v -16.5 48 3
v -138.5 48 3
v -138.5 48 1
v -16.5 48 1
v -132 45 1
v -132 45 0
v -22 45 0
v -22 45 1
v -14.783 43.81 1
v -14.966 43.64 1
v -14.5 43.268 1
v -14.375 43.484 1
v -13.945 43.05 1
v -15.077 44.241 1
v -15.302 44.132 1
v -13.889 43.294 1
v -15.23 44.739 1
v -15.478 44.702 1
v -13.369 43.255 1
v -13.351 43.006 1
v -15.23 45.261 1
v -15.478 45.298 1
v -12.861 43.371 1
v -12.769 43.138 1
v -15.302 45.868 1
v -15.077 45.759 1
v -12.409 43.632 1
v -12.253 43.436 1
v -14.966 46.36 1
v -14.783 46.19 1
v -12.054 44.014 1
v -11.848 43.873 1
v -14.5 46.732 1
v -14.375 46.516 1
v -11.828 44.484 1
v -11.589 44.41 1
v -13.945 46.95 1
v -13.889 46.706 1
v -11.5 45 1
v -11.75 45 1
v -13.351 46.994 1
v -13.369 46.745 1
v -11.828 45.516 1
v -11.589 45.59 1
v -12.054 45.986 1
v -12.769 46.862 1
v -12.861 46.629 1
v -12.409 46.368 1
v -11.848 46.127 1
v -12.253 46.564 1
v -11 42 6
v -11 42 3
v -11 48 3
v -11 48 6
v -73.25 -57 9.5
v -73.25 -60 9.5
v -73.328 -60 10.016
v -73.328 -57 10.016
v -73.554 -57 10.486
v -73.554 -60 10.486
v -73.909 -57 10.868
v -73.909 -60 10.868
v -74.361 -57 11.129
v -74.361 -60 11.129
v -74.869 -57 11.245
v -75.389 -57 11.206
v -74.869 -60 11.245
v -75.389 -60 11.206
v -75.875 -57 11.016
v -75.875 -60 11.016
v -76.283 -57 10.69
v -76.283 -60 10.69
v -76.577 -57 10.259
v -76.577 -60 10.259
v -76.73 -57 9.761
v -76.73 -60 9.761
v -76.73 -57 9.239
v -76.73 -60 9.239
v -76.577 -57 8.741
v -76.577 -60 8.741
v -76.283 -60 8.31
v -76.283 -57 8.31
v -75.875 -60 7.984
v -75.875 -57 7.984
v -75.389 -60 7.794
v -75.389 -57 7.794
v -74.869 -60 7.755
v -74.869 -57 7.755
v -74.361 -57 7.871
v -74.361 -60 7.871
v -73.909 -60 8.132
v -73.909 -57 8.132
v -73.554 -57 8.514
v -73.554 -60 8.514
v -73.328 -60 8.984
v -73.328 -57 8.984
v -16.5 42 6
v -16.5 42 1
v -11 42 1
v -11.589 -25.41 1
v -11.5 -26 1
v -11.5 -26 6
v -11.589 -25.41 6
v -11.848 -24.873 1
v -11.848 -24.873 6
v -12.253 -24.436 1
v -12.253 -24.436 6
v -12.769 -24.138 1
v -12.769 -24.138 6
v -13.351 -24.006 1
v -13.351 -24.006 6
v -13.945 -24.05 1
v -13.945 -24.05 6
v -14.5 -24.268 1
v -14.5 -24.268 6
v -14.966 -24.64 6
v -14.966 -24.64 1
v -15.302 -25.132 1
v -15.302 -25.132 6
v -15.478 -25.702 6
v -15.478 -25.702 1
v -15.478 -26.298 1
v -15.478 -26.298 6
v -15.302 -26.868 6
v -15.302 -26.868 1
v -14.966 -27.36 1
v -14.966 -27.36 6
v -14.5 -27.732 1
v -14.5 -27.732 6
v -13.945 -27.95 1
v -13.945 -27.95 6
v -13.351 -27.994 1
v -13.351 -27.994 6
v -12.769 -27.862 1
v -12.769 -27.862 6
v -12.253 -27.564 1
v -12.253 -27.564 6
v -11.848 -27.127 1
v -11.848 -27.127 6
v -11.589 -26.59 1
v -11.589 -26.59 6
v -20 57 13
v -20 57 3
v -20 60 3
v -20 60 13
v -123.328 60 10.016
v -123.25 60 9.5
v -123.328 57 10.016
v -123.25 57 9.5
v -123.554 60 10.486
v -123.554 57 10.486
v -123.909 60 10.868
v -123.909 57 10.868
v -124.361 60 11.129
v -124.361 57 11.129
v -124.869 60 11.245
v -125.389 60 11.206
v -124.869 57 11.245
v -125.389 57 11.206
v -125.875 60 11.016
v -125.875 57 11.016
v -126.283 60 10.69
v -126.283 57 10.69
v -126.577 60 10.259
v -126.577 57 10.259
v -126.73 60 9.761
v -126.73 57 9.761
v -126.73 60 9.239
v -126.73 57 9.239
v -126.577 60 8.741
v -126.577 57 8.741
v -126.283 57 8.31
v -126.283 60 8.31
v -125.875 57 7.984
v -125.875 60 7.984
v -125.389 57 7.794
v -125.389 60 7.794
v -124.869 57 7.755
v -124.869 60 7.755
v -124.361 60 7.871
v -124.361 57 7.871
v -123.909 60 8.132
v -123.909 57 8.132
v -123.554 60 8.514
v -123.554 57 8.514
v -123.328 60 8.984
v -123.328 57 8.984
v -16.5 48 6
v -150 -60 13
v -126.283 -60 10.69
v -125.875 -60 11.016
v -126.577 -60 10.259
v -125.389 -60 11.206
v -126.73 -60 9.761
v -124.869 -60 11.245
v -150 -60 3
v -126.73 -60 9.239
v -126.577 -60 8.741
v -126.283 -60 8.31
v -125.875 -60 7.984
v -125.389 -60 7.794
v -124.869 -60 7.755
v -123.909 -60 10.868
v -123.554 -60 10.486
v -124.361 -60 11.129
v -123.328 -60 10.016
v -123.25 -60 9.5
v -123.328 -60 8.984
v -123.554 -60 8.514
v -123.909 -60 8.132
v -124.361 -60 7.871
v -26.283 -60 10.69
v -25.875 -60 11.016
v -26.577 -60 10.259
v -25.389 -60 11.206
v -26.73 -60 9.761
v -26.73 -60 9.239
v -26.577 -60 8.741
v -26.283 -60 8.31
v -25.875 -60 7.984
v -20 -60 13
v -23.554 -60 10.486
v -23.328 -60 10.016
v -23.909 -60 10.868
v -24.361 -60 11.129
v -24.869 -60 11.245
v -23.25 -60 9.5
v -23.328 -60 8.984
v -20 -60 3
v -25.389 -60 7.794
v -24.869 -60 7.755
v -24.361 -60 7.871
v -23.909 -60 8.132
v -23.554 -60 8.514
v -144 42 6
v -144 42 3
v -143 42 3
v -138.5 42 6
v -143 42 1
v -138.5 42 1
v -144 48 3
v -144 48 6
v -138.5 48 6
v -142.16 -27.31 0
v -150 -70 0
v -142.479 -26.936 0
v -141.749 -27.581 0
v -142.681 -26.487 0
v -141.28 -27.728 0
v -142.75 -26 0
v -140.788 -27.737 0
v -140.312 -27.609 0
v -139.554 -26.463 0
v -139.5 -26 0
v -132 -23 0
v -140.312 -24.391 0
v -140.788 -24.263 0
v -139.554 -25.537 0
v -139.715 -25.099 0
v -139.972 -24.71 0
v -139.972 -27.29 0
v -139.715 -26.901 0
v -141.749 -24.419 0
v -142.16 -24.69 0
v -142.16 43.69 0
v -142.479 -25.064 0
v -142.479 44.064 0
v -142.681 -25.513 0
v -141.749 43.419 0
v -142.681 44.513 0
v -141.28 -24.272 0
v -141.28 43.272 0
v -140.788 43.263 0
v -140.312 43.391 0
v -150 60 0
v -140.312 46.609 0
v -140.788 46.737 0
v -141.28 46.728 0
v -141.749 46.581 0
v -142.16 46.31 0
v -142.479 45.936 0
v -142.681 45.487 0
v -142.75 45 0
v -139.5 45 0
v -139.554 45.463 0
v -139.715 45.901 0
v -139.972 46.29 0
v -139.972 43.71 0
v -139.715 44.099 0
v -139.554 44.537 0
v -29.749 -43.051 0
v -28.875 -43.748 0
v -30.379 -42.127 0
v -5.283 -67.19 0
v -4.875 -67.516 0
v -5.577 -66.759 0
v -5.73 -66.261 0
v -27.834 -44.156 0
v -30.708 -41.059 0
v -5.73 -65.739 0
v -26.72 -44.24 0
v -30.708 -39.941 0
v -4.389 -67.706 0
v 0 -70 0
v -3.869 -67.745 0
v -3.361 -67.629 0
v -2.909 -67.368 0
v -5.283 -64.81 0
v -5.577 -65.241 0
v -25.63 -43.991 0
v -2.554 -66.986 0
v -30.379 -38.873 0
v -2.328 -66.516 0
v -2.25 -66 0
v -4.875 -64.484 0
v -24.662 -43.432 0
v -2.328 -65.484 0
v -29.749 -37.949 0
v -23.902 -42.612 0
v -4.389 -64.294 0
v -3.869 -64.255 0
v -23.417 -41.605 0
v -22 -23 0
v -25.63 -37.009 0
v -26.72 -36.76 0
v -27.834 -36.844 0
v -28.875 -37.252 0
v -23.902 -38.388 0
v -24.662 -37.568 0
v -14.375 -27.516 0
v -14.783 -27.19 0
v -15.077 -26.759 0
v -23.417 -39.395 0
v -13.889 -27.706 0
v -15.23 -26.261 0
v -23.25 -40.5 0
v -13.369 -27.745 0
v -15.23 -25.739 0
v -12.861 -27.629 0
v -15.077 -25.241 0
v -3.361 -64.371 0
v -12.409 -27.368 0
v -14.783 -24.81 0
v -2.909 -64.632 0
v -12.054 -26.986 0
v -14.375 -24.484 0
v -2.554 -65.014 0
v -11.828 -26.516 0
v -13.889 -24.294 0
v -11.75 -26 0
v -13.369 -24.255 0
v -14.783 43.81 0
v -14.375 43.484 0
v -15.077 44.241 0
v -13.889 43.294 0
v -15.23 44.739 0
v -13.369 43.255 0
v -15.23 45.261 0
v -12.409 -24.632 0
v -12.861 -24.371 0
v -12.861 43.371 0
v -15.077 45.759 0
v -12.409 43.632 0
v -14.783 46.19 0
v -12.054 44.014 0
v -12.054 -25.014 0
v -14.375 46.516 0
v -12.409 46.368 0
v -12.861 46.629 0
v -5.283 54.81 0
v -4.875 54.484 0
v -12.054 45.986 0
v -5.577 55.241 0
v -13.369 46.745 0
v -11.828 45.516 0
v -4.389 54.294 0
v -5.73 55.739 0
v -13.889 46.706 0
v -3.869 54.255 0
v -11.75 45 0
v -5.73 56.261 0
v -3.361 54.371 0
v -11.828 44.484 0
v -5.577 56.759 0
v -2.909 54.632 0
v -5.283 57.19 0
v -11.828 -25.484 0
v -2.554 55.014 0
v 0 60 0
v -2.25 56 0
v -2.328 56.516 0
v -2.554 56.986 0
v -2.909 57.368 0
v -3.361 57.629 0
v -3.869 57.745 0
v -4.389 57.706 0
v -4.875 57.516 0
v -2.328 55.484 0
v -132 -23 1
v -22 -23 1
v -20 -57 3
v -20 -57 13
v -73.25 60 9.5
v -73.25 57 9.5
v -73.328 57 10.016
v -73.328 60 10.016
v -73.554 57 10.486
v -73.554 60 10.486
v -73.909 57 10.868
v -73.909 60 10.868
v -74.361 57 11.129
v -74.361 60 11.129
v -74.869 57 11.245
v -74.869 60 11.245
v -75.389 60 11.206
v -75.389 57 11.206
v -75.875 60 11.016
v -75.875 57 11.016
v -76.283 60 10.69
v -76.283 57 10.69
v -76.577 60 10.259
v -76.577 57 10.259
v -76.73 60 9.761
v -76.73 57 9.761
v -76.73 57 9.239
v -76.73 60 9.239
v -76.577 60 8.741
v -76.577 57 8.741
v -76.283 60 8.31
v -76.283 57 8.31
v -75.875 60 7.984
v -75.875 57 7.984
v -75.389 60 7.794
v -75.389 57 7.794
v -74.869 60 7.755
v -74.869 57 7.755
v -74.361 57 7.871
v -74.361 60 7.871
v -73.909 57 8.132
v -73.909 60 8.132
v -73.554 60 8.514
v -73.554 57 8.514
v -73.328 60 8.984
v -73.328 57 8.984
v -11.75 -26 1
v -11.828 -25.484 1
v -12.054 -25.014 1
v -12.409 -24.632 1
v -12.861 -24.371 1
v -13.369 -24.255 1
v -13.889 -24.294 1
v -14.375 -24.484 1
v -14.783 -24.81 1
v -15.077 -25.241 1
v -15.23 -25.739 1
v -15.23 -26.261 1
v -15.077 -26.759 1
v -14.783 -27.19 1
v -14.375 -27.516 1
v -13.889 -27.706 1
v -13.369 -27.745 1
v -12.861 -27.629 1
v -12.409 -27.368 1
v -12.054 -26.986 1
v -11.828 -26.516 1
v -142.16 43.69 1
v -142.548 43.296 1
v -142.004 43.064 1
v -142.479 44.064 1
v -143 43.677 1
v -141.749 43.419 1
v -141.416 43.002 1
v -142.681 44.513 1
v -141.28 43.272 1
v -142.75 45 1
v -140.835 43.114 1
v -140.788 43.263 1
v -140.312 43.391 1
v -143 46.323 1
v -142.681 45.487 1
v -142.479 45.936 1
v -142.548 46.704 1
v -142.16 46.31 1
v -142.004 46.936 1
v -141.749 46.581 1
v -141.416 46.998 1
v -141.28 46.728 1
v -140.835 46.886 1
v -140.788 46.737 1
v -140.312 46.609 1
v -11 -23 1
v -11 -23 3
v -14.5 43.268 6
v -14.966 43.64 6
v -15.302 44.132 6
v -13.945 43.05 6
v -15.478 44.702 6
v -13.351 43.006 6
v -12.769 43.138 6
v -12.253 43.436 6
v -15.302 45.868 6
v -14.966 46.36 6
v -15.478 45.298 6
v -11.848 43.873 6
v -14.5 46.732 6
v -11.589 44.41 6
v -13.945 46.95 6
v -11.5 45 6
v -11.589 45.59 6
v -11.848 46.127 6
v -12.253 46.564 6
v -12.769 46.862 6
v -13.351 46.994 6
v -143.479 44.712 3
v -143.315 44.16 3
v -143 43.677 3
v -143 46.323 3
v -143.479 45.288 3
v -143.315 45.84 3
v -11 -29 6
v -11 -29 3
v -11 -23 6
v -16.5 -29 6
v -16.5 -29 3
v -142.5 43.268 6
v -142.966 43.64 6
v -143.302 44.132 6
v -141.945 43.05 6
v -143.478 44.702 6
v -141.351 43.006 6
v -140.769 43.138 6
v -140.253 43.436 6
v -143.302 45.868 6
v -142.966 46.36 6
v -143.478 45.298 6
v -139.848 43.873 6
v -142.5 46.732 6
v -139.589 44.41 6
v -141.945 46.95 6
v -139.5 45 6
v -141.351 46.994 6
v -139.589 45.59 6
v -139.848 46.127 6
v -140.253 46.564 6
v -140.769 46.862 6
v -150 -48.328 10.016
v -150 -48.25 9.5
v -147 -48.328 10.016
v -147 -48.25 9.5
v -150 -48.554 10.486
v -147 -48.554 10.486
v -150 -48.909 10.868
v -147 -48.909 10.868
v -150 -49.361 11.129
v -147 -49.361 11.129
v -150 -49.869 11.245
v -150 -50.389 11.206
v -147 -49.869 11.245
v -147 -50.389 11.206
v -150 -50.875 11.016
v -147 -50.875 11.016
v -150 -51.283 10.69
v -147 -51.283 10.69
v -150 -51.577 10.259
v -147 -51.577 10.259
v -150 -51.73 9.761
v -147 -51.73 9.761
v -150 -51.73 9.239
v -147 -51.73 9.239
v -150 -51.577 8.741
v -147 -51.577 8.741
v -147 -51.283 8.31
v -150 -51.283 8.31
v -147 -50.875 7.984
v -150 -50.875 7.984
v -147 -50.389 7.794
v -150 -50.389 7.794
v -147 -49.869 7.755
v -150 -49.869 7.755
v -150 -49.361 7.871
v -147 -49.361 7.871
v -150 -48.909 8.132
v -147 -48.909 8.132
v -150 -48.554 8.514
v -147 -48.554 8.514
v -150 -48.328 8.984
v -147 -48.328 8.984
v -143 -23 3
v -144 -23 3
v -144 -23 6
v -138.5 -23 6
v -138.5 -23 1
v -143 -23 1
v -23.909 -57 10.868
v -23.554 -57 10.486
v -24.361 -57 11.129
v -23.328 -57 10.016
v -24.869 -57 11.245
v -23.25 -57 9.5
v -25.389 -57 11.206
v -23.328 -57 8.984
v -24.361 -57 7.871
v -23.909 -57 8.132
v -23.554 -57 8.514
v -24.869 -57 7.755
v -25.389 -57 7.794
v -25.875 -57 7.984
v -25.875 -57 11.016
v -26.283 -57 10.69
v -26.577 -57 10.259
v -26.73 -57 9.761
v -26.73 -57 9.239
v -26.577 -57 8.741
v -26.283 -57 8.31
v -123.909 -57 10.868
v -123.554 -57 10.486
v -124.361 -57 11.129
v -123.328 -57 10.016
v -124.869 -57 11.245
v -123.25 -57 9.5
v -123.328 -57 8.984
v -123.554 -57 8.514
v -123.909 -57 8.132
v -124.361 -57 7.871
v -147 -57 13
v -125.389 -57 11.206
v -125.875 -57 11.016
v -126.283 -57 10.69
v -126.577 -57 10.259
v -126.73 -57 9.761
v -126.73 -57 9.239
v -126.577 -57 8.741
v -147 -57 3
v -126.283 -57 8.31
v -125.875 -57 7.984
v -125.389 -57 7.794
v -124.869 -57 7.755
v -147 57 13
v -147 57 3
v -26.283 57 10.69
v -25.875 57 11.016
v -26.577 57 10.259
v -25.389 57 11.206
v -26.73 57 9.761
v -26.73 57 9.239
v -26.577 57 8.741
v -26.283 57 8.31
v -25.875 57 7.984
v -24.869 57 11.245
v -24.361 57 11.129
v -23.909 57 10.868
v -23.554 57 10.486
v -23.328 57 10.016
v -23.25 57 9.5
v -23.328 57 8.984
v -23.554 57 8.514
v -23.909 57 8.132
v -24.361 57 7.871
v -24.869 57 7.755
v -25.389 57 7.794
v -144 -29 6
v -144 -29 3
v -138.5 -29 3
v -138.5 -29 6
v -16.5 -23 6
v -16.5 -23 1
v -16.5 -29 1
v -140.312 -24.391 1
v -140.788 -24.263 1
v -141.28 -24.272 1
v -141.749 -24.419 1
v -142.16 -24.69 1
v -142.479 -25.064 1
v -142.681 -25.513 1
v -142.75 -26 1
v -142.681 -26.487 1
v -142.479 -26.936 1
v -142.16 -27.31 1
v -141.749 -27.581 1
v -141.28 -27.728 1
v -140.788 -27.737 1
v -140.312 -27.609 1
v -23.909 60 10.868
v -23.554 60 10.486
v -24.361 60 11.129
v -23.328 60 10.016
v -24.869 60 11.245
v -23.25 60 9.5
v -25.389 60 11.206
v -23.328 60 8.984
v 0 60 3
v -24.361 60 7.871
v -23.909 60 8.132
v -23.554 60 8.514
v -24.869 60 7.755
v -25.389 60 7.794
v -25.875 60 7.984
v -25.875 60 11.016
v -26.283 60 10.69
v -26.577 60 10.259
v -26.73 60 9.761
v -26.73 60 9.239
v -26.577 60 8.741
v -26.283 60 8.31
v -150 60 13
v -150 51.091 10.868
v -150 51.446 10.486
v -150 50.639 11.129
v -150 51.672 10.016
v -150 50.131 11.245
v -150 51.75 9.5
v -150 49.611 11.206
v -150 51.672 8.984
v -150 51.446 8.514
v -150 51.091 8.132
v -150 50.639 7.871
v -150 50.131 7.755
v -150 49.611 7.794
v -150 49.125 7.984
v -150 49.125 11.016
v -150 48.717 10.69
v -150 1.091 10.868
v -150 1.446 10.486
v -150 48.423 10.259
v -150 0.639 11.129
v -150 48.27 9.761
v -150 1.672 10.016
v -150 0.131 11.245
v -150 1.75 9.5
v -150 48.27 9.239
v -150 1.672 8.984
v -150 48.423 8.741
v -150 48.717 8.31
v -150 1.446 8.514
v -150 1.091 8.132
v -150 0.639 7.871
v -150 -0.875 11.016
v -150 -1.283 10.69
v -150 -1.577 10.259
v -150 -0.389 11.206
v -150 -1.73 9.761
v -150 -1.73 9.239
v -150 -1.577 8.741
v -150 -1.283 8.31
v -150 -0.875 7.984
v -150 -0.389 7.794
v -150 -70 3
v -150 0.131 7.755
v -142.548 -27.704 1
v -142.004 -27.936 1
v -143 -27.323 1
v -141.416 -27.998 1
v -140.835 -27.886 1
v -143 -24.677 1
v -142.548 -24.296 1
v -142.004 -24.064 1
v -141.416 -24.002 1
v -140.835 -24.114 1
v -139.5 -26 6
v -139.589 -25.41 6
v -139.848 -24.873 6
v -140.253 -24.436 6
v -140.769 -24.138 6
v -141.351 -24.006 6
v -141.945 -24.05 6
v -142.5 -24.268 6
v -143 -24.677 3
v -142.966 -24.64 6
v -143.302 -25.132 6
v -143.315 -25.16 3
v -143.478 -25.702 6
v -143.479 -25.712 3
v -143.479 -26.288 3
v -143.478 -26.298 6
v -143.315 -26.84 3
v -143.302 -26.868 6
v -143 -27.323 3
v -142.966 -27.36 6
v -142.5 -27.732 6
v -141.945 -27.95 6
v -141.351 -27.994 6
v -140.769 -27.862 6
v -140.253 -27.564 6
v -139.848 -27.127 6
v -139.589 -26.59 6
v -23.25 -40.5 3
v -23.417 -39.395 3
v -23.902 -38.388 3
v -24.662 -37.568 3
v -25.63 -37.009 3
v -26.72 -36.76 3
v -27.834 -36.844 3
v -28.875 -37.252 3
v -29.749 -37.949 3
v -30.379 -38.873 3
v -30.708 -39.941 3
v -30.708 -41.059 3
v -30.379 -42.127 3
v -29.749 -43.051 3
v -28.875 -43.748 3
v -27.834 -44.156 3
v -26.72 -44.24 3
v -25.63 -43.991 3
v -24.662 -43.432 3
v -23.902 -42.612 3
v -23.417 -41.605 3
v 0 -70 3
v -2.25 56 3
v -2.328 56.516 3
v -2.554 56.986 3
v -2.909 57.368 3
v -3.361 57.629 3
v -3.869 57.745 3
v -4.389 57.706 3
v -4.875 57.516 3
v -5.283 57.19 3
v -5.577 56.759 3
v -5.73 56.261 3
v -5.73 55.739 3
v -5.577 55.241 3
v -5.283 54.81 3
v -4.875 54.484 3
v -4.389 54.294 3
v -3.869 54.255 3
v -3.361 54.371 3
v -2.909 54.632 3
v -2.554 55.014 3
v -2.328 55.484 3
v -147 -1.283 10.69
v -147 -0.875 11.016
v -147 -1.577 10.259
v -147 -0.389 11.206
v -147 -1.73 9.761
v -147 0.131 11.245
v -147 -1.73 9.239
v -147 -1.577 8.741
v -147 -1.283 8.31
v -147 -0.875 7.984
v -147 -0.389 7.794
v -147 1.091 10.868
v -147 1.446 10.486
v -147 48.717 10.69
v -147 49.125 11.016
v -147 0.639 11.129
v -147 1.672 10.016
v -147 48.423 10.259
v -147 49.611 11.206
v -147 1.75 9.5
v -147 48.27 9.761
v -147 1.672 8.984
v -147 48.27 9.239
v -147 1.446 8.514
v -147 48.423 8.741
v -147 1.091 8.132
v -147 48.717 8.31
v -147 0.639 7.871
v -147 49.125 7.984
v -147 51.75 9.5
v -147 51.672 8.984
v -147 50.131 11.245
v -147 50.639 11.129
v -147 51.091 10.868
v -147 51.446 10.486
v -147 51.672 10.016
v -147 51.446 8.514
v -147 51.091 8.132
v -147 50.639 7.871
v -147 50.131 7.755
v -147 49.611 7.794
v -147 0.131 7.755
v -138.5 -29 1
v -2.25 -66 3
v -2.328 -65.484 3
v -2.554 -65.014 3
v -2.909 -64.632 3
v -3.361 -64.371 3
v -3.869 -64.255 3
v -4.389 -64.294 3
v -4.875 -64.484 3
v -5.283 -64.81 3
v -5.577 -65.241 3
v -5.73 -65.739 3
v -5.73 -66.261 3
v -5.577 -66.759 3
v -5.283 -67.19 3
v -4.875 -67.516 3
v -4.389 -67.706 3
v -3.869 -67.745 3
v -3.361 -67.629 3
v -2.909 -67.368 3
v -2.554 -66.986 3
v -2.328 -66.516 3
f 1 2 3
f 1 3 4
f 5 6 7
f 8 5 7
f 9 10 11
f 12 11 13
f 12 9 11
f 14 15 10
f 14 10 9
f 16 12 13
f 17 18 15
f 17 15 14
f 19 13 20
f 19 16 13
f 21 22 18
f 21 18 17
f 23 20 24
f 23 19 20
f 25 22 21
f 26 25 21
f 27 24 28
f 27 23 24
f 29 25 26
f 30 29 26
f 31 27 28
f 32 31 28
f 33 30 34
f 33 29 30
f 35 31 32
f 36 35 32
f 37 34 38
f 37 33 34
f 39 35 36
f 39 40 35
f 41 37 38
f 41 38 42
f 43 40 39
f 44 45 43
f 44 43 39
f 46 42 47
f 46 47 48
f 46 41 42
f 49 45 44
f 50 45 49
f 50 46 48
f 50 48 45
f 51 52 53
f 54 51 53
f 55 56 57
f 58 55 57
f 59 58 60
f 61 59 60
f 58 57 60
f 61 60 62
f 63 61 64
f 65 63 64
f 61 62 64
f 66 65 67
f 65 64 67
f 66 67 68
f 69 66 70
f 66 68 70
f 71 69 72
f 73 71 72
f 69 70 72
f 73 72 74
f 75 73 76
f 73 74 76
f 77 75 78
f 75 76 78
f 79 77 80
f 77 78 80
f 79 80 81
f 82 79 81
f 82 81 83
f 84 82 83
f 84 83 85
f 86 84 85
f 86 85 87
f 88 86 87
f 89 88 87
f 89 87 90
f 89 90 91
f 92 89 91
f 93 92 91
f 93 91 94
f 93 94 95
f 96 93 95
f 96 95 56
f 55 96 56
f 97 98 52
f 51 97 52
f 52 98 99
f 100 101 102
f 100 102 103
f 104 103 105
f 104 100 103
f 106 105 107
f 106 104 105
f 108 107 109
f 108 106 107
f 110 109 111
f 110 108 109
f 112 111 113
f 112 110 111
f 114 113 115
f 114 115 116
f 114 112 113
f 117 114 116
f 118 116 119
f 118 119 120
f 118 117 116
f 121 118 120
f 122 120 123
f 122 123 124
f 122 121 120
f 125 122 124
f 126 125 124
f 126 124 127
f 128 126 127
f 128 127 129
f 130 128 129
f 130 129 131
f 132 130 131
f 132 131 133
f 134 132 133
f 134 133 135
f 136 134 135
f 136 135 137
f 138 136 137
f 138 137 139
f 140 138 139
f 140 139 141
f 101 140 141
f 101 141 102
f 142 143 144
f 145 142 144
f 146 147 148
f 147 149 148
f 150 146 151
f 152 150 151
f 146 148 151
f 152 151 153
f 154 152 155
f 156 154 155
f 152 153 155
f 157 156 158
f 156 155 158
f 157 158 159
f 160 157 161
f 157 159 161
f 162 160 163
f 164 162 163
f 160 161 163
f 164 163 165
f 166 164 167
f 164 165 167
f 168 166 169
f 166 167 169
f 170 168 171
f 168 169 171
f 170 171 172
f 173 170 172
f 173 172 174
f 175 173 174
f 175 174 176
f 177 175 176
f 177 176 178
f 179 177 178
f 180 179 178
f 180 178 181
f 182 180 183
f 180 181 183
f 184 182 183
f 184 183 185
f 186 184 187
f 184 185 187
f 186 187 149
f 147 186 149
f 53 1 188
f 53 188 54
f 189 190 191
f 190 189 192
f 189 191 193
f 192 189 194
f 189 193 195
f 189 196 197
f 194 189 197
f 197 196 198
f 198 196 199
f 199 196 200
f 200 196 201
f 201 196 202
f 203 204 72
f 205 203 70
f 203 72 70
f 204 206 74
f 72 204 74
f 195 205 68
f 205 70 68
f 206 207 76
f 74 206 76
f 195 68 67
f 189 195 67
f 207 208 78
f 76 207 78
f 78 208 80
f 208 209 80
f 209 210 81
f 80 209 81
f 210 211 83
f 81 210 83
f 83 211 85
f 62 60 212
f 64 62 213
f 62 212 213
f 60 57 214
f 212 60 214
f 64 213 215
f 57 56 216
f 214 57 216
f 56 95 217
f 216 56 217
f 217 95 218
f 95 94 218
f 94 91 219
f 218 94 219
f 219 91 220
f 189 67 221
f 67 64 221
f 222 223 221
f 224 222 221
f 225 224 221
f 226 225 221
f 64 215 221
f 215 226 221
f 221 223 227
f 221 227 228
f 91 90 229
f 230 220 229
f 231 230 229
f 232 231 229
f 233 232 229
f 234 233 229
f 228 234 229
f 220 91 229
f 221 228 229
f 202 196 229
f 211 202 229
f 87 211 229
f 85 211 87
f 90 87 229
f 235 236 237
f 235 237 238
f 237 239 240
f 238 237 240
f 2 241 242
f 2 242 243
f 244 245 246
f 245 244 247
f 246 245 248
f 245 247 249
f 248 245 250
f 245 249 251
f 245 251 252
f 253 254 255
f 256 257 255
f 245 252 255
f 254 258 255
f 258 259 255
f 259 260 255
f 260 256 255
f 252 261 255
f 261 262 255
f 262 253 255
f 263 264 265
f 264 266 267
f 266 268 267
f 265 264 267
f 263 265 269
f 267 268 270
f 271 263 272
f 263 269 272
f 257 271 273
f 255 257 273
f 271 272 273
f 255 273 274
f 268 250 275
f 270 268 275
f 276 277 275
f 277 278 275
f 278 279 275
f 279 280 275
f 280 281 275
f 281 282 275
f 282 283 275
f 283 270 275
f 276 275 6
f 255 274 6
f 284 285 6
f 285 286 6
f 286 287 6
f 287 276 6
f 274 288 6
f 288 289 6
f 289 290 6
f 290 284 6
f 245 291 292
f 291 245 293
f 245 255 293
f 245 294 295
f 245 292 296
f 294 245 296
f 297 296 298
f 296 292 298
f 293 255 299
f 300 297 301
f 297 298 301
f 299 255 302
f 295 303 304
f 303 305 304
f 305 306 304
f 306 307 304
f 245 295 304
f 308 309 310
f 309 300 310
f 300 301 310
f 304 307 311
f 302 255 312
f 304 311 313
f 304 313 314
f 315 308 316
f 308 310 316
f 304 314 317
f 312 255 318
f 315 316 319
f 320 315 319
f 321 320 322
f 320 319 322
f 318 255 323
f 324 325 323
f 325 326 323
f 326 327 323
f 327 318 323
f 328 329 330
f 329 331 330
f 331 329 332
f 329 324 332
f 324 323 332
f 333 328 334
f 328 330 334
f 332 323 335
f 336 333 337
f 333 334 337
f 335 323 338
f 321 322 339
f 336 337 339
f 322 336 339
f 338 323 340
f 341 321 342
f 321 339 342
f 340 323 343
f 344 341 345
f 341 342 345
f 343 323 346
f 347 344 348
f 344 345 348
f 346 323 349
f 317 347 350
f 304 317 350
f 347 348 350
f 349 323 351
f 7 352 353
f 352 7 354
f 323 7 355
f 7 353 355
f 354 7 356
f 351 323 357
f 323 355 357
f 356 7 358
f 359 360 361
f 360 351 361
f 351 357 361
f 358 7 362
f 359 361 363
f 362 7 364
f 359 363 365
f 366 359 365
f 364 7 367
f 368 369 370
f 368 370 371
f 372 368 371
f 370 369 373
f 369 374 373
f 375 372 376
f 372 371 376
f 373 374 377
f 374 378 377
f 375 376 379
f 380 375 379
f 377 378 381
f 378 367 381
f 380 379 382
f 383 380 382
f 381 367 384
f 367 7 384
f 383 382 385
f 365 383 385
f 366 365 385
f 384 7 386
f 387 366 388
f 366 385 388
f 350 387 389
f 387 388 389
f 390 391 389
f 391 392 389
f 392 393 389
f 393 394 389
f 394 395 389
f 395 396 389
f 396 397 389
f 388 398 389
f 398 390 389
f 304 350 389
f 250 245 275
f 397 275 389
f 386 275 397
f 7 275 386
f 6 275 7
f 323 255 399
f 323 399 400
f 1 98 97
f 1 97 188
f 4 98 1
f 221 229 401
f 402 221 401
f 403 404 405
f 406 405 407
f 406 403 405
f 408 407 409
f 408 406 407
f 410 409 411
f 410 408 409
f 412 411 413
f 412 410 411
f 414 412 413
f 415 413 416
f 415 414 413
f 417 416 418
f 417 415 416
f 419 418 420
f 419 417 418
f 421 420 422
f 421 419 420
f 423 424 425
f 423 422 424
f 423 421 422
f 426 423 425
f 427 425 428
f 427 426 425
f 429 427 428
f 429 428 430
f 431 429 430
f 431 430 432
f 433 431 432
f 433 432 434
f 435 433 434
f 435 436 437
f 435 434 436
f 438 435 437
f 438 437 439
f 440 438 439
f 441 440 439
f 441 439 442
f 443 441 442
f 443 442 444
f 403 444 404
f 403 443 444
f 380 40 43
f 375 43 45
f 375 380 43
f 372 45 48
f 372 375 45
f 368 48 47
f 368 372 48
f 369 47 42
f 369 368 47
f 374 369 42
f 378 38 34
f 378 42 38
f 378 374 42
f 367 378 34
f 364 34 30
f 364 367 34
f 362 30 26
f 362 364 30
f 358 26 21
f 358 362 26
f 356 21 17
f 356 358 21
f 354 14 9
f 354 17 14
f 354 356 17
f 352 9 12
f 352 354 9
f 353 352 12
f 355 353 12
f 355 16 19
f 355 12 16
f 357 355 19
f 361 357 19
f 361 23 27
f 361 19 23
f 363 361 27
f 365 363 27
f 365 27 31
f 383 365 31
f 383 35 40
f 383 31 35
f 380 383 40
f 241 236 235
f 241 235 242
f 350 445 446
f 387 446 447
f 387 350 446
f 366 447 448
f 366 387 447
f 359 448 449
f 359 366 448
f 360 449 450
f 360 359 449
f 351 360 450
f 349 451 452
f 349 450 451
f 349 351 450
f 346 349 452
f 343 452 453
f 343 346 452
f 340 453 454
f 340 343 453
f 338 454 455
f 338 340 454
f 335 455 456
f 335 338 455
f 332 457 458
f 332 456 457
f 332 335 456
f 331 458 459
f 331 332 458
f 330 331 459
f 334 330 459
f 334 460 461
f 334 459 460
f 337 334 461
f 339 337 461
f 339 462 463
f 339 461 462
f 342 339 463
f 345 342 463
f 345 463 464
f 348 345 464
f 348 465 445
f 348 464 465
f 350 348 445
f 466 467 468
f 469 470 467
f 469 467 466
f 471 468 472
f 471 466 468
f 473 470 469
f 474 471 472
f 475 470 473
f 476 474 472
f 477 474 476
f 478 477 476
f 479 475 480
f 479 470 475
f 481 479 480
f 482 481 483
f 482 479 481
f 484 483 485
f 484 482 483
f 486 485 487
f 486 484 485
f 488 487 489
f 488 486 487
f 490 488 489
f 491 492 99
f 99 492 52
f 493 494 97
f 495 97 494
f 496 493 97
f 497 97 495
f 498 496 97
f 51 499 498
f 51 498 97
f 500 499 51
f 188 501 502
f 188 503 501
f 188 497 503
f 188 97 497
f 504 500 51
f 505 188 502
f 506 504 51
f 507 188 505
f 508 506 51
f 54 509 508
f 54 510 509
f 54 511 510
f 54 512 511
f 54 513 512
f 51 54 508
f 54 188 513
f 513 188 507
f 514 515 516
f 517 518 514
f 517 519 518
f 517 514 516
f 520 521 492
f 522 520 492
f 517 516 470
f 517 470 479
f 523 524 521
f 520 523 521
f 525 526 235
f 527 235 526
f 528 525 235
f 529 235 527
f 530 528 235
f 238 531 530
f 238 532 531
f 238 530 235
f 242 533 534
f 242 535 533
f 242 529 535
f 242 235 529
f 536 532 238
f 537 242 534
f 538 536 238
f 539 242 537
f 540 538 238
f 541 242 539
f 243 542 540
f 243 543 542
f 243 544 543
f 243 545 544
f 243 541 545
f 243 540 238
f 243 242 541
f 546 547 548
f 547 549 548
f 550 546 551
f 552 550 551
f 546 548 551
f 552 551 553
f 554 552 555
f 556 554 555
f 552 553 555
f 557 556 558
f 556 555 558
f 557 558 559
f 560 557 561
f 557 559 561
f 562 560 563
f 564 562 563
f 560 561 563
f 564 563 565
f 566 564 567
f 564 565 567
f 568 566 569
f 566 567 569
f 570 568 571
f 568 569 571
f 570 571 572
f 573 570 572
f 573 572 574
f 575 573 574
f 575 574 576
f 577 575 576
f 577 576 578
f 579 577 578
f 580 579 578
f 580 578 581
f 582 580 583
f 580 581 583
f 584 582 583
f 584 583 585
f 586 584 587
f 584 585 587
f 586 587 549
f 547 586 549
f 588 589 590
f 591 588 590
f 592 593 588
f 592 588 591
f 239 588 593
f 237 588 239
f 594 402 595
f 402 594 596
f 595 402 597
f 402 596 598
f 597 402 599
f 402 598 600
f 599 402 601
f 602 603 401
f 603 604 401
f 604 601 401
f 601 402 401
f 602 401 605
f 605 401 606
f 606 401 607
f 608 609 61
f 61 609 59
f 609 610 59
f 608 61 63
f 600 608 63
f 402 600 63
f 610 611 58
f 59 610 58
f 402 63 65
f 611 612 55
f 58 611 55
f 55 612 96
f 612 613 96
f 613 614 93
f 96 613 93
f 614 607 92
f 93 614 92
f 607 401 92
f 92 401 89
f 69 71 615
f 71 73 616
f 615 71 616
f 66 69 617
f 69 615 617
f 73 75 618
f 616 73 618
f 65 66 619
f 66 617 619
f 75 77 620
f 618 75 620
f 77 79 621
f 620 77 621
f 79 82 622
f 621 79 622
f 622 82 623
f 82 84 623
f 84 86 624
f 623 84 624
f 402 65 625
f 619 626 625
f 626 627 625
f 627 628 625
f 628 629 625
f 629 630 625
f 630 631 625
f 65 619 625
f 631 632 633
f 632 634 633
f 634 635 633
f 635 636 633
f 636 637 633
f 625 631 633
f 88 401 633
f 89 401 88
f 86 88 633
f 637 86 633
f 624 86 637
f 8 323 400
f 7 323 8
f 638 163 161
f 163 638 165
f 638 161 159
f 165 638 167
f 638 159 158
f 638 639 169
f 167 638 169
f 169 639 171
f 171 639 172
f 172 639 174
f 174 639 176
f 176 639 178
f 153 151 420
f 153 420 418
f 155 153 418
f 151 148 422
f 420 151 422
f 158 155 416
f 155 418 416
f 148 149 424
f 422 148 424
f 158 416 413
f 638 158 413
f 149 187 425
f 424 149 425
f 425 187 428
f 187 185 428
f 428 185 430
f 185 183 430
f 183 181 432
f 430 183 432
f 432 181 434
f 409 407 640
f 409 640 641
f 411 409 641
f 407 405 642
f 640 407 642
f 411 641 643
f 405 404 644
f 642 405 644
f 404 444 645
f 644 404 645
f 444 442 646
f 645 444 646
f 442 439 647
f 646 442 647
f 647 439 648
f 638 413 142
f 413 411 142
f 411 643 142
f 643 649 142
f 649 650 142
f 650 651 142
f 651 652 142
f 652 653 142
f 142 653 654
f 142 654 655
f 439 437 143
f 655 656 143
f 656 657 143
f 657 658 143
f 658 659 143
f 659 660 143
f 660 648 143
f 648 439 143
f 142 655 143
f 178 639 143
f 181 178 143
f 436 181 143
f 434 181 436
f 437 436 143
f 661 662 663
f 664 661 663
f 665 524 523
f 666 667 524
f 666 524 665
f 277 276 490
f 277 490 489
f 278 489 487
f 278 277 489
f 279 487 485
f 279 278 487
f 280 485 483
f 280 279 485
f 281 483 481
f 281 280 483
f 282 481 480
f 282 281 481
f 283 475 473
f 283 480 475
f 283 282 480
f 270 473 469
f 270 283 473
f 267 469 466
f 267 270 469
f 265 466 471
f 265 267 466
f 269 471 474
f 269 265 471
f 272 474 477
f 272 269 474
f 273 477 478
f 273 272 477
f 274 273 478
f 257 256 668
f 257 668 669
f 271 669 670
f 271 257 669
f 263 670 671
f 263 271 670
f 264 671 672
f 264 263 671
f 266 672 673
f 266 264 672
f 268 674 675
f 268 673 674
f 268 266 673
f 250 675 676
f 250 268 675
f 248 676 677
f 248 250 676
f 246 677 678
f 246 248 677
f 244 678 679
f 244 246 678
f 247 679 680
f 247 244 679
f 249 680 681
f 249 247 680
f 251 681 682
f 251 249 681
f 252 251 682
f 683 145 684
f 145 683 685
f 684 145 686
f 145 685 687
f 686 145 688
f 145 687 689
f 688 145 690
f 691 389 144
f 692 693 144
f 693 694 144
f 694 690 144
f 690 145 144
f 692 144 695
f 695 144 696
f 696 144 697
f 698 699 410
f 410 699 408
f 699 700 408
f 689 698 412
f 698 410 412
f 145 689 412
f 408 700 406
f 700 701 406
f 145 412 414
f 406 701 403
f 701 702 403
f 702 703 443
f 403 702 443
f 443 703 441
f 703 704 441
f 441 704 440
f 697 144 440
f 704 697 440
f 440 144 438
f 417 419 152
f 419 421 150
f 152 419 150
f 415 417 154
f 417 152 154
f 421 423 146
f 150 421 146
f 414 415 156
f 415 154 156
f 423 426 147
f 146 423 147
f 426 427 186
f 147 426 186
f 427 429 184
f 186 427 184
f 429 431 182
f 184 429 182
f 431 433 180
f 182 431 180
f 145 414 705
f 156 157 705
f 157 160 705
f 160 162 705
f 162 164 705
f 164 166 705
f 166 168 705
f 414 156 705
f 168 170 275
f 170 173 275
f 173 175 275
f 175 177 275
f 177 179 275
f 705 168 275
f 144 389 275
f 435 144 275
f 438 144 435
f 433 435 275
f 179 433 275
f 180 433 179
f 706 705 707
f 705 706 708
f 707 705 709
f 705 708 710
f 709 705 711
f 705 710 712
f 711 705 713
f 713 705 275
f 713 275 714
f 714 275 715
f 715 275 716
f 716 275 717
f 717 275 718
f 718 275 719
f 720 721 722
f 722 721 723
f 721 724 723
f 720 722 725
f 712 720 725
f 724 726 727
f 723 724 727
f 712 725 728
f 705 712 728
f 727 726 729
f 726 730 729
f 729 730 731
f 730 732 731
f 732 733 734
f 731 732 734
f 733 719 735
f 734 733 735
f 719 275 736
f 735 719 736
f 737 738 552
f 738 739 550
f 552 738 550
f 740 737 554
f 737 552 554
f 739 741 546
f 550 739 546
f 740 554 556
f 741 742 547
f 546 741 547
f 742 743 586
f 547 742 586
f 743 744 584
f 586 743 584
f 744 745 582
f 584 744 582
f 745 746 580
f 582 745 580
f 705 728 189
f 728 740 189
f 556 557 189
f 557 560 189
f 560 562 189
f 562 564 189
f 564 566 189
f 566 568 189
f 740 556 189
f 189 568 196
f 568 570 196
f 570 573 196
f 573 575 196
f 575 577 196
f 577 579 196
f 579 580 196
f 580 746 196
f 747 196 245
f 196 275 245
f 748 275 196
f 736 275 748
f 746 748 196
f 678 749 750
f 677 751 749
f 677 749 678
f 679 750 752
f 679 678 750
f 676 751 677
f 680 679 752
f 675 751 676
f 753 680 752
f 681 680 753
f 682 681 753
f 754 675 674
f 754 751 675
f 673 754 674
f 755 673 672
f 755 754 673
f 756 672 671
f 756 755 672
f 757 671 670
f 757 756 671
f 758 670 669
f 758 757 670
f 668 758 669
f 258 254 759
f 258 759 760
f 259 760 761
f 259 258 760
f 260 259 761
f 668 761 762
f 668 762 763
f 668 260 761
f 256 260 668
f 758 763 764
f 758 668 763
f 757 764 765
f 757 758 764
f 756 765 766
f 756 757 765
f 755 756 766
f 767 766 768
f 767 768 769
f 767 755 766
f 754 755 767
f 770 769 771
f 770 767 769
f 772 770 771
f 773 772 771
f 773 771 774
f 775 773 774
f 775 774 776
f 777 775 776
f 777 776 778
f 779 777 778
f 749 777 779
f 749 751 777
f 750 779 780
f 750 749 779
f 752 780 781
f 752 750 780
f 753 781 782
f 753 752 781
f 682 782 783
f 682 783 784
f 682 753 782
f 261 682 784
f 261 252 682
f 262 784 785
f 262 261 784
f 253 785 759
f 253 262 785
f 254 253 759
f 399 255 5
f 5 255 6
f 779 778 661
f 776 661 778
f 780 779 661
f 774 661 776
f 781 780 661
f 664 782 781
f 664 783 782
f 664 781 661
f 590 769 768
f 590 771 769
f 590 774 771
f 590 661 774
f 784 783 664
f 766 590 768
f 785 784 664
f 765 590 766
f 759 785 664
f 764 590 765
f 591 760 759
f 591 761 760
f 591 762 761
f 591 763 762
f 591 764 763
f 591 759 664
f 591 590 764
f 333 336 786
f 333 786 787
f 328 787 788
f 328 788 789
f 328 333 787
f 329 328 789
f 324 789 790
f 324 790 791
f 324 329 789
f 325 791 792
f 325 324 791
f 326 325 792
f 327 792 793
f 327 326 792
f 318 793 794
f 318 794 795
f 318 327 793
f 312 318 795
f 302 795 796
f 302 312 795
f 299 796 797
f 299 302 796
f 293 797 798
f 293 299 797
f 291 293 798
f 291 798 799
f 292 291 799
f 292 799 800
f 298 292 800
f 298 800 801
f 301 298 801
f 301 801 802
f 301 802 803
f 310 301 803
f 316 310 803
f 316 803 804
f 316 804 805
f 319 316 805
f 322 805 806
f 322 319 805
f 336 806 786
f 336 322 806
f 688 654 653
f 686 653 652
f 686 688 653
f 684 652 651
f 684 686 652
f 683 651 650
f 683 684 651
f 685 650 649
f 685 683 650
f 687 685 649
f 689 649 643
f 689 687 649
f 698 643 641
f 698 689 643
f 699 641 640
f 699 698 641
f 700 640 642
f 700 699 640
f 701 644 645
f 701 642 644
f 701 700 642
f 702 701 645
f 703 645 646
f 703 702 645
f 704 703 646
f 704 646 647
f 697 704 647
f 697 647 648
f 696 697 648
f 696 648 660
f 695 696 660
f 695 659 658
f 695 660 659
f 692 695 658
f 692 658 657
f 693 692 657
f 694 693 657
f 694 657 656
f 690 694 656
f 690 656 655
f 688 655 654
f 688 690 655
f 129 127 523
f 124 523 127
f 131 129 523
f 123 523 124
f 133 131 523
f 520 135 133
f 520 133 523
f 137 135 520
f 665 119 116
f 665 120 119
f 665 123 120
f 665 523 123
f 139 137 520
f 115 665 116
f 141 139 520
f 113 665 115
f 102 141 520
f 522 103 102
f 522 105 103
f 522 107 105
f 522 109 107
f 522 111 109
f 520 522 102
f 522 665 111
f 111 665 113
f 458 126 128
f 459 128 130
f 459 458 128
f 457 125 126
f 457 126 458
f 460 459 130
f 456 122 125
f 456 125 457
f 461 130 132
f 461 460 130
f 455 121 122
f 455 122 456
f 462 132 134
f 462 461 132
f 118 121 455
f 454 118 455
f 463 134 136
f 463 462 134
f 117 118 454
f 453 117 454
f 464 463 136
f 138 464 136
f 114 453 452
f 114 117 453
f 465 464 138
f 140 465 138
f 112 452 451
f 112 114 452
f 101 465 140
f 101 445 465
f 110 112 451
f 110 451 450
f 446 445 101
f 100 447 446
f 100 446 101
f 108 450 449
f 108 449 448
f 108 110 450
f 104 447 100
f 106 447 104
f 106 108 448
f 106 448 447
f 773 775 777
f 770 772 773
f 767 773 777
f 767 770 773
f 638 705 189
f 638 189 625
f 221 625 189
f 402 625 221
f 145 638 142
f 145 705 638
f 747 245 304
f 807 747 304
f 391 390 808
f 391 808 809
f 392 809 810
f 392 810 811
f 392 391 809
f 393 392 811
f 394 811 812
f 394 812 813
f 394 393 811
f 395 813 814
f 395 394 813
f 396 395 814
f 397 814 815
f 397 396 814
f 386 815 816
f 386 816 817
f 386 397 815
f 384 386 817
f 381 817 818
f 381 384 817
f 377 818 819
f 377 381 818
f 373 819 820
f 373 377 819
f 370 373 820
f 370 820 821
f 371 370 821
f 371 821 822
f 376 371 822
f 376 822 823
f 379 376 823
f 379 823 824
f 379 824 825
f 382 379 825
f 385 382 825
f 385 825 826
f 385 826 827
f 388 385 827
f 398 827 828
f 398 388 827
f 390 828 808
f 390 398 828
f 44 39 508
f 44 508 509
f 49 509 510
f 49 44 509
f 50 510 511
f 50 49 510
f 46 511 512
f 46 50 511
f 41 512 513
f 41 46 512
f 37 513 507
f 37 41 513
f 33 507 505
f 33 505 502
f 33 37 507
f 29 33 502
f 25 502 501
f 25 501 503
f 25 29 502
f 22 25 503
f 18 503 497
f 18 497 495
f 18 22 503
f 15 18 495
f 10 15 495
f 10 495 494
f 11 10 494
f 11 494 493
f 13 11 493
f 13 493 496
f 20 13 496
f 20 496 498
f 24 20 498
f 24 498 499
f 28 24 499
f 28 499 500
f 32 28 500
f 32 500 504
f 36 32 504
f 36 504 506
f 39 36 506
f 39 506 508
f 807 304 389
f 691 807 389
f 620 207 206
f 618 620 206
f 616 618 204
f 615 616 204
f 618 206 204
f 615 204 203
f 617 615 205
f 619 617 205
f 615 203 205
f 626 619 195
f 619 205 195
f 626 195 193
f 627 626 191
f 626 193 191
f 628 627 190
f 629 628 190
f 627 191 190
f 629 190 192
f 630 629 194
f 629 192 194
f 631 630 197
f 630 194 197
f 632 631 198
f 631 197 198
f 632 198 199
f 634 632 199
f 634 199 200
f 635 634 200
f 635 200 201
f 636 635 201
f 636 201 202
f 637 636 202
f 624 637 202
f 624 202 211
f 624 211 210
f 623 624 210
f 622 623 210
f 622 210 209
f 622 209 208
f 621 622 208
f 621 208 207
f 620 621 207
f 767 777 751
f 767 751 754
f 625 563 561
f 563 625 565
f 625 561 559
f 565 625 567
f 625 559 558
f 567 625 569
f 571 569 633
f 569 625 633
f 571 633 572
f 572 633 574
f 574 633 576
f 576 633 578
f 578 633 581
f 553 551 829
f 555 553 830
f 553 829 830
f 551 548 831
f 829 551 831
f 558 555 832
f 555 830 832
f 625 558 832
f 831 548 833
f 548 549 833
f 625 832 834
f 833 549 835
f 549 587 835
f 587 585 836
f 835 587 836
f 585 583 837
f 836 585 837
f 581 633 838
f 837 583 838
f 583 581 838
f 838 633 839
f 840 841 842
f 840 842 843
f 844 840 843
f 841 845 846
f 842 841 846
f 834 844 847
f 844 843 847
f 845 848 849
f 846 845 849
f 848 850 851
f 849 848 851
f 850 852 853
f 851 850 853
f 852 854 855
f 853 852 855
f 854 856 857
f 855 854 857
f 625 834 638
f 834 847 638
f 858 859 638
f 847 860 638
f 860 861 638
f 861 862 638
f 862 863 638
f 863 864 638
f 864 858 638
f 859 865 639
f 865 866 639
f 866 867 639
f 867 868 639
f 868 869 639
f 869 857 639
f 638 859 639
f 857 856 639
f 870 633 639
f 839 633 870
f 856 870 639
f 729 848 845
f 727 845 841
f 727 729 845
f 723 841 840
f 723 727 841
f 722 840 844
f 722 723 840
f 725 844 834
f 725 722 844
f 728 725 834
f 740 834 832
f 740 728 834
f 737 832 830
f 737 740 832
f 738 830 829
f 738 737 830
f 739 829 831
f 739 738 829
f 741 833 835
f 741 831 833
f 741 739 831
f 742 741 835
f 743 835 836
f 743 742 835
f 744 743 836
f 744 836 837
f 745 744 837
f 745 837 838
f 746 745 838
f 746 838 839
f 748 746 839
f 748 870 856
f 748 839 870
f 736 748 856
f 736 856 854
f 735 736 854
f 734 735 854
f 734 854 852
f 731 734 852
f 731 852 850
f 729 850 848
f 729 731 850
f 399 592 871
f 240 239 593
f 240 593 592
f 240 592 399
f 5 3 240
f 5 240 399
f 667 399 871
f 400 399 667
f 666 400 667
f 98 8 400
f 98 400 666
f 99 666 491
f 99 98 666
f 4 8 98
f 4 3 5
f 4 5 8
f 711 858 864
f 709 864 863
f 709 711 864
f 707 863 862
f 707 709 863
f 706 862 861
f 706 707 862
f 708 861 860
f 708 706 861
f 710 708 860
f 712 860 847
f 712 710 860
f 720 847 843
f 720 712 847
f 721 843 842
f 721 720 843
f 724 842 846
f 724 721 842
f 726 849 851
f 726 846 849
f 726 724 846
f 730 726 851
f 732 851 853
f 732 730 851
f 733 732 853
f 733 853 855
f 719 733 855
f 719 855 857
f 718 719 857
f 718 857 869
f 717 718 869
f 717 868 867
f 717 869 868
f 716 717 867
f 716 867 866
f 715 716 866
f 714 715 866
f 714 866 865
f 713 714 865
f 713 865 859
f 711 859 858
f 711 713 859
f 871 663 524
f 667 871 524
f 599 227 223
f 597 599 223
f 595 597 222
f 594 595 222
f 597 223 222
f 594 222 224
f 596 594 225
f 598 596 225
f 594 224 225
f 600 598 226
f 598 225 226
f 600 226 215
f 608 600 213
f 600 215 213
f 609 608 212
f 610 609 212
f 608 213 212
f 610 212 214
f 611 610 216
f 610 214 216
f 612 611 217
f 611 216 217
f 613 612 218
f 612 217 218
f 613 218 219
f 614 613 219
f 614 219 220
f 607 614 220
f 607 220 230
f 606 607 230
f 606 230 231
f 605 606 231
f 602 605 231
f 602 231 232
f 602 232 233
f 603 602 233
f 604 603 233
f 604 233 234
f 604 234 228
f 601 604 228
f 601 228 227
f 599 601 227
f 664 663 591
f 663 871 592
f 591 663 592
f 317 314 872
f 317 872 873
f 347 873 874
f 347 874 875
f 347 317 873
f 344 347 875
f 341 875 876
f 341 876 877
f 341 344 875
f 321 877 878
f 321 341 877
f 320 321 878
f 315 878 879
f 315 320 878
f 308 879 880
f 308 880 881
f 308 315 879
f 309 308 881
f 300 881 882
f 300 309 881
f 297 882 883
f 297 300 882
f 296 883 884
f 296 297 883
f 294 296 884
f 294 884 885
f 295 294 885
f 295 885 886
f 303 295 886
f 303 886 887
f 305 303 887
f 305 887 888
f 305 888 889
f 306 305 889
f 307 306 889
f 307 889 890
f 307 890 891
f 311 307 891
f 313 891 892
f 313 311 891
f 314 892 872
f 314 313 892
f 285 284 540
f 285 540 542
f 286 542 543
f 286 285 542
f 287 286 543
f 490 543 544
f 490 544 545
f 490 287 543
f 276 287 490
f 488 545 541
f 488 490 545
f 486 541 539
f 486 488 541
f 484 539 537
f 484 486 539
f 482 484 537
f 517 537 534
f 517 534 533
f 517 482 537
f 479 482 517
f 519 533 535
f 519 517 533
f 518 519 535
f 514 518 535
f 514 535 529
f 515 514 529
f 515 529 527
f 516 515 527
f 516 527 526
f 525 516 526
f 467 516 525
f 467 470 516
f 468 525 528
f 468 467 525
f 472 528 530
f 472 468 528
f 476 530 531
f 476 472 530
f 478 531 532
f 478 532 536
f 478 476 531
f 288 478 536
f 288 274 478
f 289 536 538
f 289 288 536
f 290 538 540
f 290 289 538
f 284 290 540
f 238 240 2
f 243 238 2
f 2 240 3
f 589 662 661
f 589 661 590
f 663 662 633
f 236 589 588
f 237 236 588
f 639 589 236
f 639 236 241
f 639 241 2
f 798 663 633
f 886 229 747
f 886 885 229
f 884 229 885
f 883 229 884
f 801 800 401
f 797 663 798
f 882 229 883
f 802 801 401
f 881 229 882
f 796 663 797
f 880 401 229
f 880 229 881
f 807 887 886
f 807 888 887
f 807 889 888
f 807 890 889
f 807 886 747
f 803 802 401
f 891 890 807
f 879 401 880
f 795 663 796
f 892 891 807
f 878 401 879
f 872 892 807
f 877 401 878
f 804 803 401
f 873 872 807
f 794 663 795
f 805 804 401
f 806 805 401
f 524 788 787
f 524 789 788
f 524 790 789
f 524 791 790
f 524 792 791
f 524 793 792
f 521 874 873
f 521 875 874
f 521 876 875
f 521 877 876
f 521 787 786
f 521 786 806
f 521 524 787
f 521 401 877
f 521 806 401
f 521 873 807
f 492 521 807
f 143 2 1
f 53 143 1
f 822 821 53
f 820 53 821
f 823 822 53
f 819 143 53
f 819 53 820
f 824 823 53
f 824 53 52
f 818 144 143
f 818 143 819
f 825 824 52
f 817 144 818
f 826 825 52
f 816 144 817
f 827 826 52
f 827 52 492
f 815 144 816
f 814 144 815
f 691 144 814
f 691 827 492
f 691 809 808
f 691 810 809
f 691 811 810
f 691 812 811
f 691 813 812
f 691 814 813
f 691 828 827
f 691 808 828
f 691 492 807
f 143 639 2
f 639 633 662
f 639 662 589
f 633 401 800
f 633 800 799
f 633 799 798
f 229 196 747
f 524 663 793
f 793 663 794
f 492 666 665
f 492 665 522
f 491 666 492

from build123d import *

# Parameters (mm, degrees)
SKETCH_W        = 150
SKETCH_H        = 130
SKETCH_R        = 3.75
SKETCH_R_2      = 1.75
SKETCH_W_2      = 110
SKETCH_H_2      = 68
PAD_DEPTH       = 3
SKETCH002_W     = 132
SKETCH002_H     = 77
POCKET001_DEPTH = 2.5
SKETCH007_W     = 5.5
SKETCH007_H     = 6
SKETCH007_R     = 2
PAD002_DEPTH    = 6
PAD003_DEPTH    = 10
SKETCH010_R     = 1.75
POCKET002_DEPTH = 6
SKETCH011_R     = 1.75
POCKET003_DEPTH = 7.5
SKETCH012_R     = 1.75
POCKET004_DEPTH = 7.5


with BuildPart() as part:
    # Sketch → Pad (new body)
    with BuildSketch(Plane.XY):
        with Locations((-75, -5)):
            Rectangle(SKETCH_W, SKETCH_H)
        with Locations((-27, -40.5)):
            Circle(SKETCH_R, mode=Mode.SUBTRACT)
        with Locations((-141, 45)):
            Circle(SKETCH_R_2, mode=Mode.SUBTRACT)
        with Locations((-141, -26)):
            Circle(SKETCH_R_2, mode=Mode.SUBTRACT)
        with Locations((-13.5, 45)):
            Circle(SKETCH_R_2, mode=Mode.SUBTRACT)
        with Locations((-13.5, -26)):
            Circle(SKETCH_R_2, mode=Mode.SUBTRACT)
        with Locations((-4, 56)):
            Circle(SKETCH_R_2, mode=Mode.SUBTRACT)
        with Locations((-4, -66)):
            Circle(SKETCH_R_2, mode=Mode.SUBTRACT)
        with Locations((-77, 11)):
            Rectangle(SKETCH_W_2, SKETCH_H_2, mode=Mode.SUBTRACT)
    extrude(amount=PAD_DEPTH)

    # Sketch002 → Pocket001 (cut)
    with BuildSketch(Plane.XY.offset(3.5)):
        with Locations((-77, 9.5)):
            Rectangle(SKETCH002_W, SKETCH002_H)
    extrude(amount=-POCKET001_DEPTH, mode=Mode.SUBTRACT)

    # Sketch007 → Pad002 (join)
    with BuildSketch(Plane.XY):
        with Locations((-141.25, 45)):
            Rectangle(SKETCH007_W, SKETCH007_H)
        with Locations((-141.5, 45)):
            Circle(SKETCH007_R, mode=Mode.SUBTRACT)
        with Locations((-13.75, 45)):
            Rectangle(SKETCH007_W, SKETCH007_H)
        with Locations((-13.5, 45)):
            Circle(SKETCH007_R, mode=Mode.SUBTRACT)
        with Locations((-13.75, -26)):
            Rectangle(SKETCH007_W, SKETCH007_H)
        with Locations((-13.5, -26)):
            Circle(SKETCH007_R, mode=Mode.SUBTRACT)
        with Locations((-141.25, -26)):
            Rectangle(SKETCH007_W, SKETCH007_H)
        with Locations((-141.5, -26)):
            Circle(SKETCH007_R, mode=Mode.SUBTRACT)
    extrude(amount=PAD002_DEPTH)

    # Sketch003 (on DatumPlane) → Pad003 (join)
    with BuildSketch(Plane.XY.offset(3)):
        Polygon((-20, 60), (-150, 60), (-150, -60), (-20, -60), (-20, -57), (-147, -57), (-147, 57), (-20, 57), align=None)
    extrude(amount=PAD003_DEPTH)

    # Sketch010 → Pocket002 (cut)
    with BuildSketch(Plane.XZ.offset(60)):
        with Locations((-125, 9.5)):
            Circle(SKETCH010_R)
        with Locations((-25, 9.5)):
            Circle(SKETCH010_R)
        with Locations((-75, 9.5)):
            Circle(SKETCH010_R)
    extrude(amount=-POCKET002_DEPTH, mode=Mode.SUBTRACT)

    # Sketch011 → Pocket003 (cut, symmetric)
    with BuildSketch(Plane.XZ.offset(-60)):
        with Locations((-75, 9.5)):
            Circle(SKETCH011_R)
        with Locations((-25, 9.5)):
            Circle(SKETCH011_R)
        with Locations((-125, 9.5)):
            Circle(SKETCH011_R)
    extrude(amount=POCKET003_DEPTH, both=True, mode=Mode.SUBTRACT)

    # Sketch012 (on DatumPlane) → Pocket004 (cut, symmetric)
    with BuildSketch(Plane.YZ.offset(-150)):
        with Locations((0, 9.5)):
            Circle(SKETCH012_R)
        with Locations((50, 9.5)):
            Circle(SKETCH012_R)
        with Locations((-50, 9.5)):
            Circle(SKETCH012_R)
    extrude(amount=POCKET004_DEPTH, both=True, mode=Mode.SUBTRACT)


solid = part.part
